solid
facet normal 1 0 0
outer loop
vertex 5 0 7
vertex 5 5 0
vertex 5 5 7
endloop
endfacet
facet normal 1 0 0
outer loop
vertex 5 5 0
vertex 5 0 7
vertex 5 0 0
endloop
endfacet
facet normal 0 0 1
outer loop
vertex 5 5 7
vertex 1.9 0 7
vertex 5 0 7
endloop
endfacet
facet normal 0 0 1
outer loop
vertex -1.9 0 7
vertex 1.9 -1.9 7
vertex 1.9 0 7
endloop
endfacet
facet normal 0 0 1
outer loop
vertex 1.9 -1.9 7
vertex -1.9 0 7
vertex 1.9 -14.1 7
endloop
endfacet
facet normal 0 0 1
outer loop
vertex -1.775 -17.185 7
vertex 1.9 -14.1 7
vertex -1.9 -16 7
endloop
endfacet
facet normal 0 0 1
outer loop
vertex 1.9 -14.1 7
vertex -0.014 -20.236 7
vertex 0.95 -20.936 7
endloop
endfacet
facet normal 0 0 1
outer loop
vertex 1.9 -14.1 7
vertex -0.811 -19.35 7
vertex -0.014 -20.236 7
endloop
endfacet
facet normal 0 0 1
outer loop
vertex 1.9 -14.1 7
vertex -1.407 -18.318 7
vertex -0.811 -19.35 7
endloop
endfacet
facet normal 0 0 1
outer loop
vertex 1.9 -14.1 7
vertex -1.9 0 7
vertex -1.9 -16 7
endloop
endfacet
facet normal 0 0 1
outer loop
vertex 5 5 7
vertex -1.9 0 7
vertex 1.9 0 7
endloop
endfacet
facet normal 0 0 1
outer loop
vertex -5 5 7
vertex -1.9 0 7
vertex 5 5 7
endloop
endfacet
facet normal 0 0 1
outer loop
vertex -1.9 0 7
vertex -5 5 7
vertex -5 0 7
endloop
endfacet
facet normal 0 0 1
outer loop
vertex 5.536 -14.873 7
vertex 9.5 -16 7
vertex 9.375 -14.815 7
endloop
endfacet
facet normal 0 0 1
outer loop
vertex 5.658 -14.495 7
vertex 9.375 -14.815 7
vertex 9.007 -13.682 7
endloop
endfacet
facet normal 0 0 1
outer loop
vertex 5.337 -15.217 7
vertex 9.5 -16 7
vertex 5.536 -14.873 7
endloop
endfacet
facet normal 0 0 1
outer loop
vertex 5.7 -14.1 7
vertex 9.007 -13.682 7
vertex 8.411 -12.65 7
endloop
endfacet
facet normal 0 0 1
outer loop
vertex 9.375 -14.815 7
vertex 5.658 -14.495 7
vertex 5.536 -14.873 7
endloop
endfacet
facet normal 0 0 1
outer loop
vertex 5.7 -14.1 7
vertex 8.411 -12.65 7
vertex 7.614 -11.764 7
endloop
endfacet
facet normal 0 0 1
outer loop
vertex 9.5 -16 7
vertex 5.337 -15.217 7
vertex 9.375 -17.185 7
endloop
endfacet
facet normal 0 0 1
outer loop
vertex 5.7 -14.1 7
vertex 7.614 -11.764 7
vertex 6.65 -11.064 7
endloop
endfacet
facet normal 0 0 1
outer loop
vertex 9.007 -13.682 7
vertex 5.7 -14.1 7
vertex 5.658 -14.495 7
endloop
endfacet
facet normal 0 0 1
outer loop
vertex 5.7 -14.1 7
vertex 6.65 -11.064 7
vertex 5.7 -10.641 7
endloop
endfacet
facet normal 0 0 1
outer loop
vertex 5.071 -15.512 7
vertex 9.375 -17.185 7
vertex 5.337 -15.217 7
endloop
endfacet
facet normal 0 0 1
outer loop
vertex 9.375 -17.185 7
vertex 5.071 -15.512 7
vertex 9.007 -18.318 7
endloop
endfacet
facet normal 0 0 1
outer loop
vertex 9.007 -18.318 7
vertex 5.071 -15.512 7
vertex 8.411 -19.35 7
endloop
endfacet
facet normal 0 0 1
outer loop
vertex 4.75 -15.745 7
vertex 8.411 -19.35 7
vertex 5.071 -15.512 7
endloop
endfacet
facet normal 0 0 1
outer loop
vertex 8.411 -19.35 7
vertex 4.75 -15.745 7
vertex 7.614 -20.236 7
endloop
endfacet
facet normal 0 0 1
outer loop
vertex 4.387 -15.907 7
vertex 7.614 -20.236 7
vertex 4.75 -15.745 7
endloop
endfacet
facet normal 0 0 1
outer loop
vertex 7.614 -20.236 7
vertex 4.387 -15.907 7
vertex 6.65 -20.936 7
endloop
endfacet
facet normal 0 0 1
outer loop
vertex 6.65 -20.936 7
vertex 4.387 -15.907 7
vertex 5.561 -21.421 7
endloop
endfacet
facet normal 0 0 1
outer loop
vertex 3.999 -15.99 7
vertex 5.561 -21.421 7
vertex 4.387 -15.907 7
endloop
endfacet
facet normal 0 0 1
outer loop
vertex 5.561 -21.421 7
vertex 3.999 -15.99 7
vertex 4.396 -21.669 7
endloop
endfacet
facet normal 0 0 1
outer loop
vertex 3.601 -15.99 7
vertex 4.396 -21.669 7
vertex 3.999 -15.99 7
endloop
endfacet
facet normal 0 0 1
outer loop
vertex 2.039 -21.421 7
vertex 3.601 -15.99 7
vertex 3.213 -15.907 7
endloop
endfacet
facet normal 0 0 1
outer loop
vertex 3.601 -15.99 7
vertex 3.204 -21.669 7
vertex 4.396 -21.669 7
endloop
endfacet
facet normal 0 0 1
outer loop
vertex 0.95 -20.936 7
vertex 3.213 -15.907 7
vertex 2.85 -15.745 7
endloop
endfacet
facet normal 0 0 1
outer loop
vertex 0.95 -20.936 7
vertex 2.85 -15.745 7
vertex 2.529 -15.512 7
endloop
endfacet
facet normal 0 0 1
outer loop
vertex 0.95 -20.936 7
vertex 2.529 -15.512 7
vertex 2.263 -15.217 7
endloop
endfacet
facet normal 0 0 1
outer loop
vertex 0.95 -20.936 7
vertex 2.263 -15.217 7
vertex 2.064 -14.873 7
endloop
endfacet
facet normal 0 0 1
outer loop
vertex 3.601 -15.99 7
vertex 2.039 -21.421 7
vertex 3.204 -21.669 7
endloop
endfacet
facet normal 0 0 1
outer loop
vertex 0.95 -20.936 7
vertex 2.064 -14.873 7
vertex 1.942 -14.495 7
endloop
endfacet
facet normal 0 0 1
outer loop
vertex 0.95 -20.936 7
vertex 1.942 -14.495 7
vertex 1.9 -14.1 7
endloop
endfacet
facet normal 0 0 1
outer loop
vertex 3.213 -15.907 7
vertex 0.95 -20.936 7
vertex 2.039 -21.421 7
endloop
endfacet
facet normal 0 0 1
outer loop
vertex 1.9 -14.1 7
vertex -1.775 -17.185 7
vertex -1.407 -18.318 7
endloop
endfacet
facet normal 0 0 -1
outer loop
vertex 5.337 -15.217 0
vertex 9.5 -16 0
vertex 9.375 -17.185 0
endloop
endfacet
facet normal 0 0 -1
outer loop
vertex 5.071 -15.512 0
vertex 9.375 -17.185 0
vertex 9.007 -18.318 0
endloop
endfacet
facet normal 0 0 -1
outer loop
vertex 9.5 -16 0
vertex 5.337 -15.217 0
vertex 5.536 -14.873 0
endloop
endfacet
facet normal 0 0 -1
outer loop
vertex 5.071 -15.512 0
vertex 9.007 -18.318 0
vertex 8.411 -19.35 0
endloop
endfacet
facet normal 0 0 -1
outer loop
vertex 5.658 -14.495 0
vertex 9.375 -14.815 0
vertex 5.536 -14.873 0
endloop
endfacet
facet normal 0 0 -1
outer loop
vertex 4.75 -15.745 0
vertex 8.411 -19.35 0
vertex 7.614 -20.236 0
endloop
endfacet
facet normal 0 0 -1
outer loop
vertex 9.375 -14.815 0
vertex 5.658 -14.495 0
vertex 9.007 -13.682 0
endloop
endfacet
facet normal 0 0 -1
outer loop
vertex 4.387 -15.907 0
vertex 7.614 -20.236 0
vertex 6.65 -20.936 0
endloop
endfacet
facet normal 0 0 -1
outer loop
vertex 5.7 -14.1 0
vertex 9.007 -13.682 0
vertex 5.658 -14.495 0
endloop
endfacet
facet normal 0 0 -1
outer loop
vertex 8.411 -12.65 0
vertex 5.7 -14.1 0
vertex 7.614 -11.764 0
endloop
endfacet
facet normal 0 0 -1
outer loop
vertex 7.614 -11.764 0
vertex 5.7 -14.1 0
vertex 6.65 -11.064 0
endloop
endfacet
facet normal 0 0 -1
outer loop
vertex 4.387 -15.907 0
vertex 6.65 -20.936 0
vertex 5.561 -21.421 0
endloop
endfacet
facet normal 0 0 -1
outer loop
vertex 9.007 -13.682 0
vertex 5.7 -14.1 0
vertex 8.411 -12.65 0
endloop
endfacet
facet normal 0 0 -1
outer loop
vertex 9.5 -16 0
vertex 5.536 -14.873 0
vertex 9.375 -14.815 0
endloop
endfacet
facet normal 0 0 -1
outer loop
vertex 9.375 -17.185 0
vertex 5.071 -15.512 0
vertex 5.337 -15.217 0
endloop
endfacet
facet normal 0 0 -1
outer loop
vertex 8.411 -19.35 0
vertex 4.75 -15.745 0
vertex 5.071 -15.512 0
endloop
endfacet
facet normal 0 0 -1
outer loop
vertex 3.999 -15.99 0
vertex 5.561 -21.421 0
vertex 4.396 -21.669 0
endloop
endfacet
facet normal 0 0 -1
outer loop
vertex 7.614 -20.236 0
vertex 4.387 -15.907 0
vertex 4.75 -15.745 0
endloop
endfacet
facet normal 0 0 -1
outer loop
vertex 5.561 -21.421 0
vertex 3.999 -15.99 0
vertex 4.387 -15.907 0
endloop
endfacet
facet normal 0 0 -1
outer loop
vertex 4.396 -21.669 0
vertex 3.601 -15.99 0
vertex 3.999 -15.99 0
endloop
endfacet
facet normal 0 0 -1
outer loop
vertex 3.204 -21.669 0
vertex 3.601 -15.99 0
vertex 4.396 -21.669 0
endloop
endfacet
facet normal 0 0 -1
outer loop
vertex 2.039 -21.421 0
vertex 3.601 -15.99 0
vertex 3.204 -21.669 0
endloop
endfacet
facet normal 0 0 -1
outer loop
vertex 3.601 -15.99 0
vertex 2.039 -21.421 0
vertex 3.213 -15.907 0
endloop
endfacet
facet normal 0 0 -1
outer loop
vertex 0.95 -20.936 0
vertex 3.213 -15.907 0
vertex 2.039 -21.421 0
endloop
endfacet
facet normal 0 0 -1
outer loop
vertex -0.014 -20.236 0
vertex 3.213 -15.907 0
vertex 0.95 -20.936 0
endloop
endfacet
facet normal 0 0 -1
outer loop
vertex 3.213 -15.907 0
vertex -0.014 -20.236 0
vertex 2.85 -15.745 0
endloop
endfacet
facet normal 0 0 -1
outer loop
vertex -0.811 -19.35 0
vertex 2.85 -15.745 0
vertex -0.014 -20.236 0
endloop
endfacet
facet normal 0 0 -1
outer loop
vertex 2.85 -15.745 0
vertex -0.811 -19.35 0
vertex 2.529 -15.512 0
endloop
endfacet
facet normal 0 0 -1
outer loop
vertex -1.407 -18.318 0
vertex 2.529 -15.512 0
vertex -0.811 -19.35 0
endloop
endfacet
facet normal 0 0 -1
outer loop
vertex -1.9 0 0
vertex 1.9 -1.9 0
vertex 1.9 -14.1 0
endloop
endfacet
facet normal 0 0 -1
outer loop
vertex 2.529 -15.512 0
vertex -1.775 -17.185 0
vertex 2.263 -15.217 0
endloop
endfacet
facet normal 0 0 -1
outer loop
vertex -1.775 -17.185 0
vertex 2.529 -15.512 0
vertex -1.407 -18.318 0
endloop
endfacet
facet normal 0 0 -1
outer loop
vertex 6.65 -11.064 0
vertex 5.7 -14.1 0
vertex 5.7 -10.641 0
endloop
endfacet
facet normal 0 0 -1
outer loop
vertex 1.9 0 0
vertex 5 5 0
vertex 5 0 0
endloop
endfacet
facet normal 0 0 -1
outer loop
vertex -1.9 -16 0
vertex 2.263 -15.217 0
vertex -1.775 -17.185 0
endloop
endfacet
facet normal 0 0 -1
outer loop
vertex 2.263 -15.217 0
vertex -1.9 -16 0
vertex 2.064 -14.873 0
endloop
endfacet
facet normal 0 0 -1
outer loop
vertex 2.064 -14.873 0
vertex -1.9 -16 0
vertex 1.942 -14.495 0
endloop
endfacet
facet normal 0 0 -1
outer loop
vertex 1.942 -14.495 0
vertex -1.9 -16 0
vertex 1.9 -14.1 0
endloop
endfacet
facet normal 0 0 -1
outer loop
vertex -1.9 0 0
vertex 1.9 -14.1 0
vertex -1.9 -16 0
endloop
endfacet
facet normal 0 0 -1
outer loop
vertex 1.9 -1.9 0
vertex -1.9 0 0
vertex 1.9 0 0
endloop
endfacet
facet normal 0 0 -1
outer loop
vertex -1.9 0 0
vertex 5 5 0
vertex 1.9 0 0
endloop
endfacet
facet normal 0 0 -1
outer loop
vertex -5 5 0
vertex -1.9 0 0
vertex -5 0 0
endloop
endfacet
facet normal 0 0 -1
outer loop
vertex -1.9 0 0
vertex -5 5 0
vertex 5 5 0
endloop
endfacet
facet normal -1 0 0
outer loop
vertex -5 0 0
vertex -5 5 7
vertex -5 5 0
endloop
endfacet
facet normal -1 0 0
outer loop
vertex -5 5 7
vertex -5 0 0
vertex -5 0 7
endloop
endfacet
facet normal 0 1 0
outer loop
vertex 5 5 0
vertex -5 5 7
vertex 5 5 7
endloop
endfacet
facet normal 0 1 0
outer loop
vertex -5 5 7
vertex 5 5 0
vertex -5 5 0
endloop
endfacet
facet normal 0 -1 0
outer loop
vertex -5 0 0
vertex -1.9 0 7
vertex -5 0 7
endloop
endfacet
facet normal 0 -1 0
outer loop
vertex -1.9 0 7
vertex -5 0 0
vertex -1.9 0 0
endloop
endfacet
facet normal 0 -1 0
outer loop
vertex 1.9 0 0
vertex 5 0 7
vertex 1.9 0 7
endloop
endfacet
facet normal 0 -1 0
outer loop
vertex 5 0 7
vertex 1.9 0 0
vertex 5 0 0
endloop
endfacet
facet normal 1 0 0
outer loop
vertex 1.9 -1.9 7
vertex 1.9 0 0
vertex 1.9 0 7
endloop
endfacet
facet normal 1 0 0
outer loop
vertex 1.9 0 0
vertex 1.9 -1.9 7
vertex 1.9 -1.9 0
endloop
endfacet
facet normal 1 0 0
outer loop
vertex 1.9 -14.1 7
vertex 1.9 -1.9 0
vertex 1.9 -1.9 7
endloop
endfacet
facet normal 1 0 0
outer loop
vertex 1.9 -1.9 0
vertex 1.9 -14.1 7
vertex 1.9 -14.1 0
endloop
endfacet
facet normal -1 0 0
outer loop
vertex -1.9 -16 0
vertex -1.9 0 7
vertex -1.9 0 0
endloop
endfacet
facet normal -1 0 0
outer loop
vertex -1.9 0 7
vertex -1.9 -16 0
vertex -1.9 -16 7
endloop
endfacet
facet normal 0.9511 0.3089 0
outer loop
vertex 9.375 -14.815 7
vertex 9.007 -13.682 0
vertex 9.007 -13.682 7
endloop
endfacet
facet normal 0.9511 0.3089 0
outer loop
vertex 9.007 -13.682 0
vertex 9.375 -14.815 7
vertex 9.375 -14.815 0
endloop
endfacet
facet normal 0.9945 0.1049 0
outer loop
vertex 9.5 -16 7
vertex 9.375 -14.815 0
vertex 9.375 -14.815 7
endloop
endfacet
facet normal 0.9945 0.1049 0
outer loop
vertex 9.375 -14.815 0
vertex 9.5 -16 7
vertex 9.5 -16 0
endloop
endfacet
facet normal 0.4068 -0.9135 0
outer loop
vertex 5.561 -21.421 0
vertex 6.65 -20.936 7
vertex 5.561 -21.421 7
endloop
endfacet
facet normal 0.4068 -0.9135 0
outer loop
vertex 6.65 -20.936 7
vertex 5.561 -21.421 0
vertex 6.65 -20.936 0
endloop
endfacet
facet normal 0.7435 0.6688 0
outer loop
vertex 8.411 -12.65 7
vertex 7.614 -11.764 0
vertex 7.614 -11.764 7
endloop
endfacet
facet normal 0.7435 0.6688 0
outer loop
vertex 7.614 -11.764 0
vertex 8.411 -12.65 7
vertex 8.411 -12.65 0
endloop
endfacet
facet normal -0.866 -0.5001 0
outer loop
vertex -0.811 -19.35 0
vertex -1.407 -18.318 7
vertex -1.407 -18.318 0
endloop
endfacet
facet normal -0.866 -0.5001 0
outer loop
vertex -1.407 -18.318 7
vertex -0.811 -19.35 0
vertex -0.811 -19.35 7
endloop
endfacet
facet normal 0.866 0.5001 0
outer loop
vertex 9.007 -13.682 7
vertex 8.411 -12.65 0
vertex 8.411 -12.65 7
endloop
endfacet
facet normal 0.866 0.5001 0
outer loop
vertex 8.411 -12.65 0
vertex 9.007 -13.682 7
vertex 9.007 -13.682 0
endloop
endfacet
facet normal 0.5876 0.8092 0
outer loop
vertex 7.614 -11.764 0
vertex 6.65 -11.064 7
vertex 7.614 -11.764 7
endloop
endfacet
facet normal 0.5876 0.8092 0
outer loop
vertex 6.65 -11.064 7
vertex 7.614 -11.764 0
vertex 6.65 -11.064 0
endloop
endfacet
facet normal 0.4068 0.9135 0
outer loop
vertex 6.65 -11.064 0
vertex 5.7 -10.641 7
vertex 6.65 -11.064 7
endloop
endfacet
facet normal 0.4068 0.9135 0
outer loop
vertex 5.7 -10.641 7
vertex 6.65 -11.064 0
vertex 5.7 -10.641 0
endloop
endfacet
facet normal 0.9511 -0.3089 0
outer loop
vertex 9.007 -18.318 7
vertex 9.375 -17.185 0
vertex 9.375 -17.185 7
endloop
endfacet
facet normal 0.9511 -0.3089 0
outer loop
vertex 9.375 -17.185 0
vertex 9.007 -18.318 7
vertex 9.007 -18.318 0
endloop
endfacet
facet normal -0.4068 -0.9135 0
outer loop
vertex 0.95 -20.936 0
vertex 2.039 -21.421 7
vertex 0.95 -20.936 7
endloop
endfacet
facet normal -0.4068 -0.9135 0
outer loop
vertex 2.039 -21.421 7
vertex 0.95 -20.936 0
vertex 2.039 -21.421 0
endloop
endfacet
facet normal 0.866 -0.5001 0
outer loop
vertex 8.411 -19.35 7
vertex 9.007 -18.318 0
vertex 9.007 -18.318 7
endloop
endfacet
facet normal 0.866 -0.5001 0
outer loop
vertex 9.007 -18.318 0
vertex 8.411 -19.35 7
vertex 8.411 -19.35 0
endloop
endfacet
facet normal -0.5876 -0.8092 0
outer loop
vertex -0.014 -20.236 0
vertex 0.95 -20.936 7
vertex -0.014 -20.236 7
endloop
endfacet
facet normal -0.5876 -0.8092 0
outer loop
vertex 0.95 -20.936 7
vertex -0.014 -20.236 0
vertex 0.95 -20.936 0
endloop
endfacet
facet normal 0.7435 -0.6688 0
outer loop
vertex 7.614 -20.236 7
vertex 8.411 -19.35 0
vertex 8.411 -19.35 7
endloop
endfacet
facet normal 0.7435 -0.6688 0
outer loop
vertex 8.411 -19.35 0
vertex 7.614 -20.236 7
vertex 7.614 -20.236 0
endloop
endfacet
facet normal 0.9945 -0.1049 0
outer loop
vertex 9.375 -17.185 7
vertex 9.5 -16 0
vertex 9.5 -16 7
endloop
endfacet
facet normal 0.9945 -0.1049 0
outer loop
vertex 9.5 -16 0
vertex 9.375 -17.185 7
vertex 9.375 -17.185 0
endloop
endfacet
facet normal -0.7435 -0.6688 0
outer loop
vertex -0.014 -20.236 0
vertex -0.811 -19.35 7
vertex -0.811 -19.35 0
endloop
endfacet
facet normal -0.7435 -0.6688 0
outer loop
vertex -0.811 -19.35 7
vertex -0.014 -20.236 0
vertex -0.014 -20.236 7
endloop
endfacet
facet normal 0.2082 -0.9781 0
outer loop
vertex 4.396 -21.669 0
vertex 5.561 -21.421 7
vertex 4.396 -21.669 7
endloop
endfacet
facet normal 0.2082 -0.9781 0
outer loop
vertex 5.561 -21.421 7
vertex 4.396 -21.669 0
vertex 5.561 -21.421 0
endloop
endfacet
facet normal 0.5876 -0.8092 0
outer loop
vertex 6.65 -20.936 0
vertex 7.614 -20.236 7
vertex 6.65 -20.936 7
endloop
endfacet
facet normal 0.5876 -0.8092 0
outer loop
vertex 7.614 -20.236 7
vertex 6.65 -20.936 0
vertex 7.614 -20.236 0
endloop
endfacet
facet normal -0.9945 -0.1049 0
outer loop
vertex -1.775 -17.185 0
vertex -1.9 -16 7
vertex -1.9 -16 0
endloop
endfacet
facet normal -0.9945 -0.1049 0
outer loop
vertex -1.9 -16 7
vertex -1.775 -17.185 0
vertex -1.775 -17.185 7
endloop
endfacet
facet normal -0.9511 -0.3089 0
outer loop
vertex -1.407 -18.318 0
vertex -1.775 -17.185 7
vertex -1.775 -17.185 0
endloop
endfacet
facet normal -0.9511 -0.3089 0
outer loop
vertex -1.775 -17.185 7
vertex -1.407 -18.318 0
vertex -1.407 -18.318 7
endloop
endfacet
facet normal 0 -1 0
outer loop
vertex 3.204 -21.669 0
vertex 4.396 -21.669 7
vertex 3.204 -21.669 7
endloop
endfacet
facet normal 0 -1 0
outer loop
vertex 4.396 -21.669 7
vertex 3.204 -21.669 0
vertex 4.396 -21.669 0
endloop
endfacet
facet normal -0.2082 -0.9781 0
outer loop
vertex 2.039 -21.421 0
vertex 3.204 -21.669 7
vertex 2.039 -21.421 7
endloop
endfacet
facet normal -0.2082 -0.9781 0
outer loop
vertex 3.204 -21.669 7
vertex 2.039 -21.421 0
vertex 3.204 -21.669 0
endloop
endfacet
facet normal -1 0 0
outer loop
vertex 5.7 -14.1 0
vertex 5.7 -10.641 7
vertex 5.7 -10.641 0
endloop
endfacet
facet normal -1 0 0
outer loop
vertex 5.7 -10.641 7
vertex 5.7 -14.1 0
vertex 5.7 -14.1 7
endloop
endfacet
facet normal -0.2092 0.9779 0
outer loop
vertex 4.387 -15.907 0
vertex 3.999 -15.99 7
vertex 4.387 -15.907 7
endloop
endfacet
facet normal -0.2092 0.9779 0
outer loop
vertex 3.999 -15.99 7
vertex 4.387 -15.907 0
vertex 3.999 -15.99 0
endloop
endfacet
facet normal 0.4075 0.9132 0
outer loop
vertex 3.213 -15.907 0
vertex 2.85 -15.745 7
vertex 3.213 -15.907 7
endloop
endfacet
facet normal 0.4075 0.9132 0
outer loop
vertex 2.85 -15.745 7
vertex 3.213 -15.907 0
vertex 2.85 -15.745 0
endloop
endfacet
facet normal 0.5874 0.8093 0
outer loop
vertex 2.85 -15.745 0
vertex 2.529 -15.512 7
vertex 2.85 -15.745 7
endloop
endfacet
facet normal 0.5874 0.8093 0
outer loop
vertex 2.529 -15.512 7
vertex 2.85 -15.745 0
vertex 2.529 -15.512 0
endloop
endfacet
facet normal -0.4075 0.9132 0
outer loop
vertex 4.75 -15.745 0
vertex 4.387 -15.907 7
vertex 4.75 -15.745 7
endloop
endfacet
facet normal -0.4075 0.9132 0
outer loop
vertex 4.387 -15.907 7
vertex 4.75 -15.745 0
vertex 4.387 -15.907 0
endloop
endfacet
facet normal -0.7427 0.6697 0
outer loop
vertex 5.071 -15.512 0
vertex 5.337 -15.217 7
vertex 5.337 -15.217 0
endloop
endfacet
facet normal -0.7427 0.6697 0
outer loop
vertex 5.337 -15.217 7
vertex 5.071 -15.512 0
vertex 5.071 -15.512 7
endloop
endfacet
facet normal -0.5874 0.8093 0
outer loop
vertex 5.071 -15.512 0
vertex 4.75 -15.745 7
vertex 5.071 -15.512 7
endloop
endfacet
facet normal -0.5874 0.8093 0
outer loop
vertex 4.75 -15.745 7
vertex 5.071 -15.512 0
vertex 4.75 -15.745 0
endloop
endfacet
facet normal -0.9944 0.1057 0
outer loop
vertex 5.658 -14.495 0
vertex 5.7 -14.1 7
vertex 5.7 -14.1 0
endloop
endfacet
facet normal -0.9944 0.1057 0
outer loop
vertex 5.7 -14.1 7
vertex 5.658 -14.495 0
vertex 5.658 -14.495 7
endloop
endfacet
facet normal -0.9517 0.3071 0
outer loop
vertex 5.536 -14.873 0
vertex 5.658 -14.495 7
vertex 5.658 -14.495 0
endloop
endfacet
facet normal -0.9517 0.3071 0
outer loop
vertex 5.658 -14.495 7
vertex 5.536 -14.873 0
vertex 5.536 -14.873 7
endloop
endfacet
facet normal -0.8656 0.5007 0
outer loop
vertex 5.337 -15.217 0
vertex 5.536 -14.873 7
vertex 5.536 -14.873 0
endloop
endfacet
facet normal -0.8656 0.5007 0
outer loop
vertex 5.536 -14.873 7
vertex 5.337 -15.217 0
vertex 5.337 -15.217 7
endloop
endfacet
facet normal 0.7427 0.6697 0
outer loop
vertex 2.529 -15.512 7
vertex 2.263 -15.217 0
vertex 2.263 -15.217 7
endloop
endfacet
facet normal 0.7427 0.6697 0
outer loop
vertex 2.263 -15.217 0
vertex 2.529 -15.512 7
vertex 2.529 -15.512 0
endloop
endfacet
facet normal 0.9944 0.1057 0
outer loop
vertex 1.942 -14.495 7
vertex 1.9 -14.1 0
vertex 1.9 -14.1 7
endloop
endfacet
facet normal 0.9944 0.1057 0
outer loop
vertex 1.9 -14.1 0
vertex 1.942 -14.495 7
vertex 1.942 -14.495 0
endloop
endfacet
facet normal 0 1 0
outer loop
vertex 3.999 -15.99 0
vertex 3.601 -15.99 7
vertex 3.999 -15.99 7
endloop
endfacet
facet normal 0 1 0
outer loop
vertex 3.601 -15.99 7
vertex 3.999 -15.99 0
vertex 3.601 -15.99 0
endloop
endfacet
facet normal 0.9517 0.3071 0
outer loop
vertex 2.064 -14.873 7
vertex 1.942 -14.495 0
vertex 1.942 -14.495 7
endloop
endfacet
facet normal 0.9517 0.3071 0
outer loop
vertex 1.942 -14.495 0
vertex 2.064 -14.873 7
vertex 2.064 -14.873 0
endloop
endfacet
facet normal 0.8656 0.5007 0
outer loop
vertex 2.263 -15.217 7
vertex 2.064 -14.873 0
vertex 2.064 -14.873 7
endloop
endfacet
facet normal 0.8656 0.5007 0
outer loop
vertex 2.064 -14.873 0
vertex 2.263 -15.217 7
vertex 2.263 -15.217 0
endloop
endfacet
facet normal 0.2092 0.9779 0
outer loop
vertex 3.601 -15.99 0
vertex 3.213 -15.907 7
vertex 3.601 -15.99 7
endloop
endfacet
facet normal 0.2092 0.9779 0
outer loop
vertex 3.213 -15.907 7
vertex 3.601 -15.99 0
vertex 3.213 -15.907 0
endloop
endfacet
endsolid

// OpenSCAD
// Breite
b = 7 ; // [4:0.2:10]

// Länge
l = 16 ; // [10:0.2:40]

// Dicke
d = 3.8 ; // [2:0.2:5]

////////////////////////////////////////////////////////////////////////////////

difference()
{
  union()
  {
    translate([0, 2.5, b/2])  cube([10, 5, b], center=true) ;
    translate([0, -l/2, b/2])  cube([d, l, b], center=true) ;

    translate([d, -l, 0]) cylinder(r = d*1.5, h=b, $fn=30) ;
  }

  translate([d, -l/2, (b+1)/2]) cube([d, l-d, b+2], center=true) ;
  translate([d, -l+d/2, (b+1)/2])  cylinder(d=d, h=b+2, center=true, $fn=30) ;
}

////////////////////////////////////////////////////////////////////////////////
// EOT
////////////////////////////////////////////////////////////////////////////////
